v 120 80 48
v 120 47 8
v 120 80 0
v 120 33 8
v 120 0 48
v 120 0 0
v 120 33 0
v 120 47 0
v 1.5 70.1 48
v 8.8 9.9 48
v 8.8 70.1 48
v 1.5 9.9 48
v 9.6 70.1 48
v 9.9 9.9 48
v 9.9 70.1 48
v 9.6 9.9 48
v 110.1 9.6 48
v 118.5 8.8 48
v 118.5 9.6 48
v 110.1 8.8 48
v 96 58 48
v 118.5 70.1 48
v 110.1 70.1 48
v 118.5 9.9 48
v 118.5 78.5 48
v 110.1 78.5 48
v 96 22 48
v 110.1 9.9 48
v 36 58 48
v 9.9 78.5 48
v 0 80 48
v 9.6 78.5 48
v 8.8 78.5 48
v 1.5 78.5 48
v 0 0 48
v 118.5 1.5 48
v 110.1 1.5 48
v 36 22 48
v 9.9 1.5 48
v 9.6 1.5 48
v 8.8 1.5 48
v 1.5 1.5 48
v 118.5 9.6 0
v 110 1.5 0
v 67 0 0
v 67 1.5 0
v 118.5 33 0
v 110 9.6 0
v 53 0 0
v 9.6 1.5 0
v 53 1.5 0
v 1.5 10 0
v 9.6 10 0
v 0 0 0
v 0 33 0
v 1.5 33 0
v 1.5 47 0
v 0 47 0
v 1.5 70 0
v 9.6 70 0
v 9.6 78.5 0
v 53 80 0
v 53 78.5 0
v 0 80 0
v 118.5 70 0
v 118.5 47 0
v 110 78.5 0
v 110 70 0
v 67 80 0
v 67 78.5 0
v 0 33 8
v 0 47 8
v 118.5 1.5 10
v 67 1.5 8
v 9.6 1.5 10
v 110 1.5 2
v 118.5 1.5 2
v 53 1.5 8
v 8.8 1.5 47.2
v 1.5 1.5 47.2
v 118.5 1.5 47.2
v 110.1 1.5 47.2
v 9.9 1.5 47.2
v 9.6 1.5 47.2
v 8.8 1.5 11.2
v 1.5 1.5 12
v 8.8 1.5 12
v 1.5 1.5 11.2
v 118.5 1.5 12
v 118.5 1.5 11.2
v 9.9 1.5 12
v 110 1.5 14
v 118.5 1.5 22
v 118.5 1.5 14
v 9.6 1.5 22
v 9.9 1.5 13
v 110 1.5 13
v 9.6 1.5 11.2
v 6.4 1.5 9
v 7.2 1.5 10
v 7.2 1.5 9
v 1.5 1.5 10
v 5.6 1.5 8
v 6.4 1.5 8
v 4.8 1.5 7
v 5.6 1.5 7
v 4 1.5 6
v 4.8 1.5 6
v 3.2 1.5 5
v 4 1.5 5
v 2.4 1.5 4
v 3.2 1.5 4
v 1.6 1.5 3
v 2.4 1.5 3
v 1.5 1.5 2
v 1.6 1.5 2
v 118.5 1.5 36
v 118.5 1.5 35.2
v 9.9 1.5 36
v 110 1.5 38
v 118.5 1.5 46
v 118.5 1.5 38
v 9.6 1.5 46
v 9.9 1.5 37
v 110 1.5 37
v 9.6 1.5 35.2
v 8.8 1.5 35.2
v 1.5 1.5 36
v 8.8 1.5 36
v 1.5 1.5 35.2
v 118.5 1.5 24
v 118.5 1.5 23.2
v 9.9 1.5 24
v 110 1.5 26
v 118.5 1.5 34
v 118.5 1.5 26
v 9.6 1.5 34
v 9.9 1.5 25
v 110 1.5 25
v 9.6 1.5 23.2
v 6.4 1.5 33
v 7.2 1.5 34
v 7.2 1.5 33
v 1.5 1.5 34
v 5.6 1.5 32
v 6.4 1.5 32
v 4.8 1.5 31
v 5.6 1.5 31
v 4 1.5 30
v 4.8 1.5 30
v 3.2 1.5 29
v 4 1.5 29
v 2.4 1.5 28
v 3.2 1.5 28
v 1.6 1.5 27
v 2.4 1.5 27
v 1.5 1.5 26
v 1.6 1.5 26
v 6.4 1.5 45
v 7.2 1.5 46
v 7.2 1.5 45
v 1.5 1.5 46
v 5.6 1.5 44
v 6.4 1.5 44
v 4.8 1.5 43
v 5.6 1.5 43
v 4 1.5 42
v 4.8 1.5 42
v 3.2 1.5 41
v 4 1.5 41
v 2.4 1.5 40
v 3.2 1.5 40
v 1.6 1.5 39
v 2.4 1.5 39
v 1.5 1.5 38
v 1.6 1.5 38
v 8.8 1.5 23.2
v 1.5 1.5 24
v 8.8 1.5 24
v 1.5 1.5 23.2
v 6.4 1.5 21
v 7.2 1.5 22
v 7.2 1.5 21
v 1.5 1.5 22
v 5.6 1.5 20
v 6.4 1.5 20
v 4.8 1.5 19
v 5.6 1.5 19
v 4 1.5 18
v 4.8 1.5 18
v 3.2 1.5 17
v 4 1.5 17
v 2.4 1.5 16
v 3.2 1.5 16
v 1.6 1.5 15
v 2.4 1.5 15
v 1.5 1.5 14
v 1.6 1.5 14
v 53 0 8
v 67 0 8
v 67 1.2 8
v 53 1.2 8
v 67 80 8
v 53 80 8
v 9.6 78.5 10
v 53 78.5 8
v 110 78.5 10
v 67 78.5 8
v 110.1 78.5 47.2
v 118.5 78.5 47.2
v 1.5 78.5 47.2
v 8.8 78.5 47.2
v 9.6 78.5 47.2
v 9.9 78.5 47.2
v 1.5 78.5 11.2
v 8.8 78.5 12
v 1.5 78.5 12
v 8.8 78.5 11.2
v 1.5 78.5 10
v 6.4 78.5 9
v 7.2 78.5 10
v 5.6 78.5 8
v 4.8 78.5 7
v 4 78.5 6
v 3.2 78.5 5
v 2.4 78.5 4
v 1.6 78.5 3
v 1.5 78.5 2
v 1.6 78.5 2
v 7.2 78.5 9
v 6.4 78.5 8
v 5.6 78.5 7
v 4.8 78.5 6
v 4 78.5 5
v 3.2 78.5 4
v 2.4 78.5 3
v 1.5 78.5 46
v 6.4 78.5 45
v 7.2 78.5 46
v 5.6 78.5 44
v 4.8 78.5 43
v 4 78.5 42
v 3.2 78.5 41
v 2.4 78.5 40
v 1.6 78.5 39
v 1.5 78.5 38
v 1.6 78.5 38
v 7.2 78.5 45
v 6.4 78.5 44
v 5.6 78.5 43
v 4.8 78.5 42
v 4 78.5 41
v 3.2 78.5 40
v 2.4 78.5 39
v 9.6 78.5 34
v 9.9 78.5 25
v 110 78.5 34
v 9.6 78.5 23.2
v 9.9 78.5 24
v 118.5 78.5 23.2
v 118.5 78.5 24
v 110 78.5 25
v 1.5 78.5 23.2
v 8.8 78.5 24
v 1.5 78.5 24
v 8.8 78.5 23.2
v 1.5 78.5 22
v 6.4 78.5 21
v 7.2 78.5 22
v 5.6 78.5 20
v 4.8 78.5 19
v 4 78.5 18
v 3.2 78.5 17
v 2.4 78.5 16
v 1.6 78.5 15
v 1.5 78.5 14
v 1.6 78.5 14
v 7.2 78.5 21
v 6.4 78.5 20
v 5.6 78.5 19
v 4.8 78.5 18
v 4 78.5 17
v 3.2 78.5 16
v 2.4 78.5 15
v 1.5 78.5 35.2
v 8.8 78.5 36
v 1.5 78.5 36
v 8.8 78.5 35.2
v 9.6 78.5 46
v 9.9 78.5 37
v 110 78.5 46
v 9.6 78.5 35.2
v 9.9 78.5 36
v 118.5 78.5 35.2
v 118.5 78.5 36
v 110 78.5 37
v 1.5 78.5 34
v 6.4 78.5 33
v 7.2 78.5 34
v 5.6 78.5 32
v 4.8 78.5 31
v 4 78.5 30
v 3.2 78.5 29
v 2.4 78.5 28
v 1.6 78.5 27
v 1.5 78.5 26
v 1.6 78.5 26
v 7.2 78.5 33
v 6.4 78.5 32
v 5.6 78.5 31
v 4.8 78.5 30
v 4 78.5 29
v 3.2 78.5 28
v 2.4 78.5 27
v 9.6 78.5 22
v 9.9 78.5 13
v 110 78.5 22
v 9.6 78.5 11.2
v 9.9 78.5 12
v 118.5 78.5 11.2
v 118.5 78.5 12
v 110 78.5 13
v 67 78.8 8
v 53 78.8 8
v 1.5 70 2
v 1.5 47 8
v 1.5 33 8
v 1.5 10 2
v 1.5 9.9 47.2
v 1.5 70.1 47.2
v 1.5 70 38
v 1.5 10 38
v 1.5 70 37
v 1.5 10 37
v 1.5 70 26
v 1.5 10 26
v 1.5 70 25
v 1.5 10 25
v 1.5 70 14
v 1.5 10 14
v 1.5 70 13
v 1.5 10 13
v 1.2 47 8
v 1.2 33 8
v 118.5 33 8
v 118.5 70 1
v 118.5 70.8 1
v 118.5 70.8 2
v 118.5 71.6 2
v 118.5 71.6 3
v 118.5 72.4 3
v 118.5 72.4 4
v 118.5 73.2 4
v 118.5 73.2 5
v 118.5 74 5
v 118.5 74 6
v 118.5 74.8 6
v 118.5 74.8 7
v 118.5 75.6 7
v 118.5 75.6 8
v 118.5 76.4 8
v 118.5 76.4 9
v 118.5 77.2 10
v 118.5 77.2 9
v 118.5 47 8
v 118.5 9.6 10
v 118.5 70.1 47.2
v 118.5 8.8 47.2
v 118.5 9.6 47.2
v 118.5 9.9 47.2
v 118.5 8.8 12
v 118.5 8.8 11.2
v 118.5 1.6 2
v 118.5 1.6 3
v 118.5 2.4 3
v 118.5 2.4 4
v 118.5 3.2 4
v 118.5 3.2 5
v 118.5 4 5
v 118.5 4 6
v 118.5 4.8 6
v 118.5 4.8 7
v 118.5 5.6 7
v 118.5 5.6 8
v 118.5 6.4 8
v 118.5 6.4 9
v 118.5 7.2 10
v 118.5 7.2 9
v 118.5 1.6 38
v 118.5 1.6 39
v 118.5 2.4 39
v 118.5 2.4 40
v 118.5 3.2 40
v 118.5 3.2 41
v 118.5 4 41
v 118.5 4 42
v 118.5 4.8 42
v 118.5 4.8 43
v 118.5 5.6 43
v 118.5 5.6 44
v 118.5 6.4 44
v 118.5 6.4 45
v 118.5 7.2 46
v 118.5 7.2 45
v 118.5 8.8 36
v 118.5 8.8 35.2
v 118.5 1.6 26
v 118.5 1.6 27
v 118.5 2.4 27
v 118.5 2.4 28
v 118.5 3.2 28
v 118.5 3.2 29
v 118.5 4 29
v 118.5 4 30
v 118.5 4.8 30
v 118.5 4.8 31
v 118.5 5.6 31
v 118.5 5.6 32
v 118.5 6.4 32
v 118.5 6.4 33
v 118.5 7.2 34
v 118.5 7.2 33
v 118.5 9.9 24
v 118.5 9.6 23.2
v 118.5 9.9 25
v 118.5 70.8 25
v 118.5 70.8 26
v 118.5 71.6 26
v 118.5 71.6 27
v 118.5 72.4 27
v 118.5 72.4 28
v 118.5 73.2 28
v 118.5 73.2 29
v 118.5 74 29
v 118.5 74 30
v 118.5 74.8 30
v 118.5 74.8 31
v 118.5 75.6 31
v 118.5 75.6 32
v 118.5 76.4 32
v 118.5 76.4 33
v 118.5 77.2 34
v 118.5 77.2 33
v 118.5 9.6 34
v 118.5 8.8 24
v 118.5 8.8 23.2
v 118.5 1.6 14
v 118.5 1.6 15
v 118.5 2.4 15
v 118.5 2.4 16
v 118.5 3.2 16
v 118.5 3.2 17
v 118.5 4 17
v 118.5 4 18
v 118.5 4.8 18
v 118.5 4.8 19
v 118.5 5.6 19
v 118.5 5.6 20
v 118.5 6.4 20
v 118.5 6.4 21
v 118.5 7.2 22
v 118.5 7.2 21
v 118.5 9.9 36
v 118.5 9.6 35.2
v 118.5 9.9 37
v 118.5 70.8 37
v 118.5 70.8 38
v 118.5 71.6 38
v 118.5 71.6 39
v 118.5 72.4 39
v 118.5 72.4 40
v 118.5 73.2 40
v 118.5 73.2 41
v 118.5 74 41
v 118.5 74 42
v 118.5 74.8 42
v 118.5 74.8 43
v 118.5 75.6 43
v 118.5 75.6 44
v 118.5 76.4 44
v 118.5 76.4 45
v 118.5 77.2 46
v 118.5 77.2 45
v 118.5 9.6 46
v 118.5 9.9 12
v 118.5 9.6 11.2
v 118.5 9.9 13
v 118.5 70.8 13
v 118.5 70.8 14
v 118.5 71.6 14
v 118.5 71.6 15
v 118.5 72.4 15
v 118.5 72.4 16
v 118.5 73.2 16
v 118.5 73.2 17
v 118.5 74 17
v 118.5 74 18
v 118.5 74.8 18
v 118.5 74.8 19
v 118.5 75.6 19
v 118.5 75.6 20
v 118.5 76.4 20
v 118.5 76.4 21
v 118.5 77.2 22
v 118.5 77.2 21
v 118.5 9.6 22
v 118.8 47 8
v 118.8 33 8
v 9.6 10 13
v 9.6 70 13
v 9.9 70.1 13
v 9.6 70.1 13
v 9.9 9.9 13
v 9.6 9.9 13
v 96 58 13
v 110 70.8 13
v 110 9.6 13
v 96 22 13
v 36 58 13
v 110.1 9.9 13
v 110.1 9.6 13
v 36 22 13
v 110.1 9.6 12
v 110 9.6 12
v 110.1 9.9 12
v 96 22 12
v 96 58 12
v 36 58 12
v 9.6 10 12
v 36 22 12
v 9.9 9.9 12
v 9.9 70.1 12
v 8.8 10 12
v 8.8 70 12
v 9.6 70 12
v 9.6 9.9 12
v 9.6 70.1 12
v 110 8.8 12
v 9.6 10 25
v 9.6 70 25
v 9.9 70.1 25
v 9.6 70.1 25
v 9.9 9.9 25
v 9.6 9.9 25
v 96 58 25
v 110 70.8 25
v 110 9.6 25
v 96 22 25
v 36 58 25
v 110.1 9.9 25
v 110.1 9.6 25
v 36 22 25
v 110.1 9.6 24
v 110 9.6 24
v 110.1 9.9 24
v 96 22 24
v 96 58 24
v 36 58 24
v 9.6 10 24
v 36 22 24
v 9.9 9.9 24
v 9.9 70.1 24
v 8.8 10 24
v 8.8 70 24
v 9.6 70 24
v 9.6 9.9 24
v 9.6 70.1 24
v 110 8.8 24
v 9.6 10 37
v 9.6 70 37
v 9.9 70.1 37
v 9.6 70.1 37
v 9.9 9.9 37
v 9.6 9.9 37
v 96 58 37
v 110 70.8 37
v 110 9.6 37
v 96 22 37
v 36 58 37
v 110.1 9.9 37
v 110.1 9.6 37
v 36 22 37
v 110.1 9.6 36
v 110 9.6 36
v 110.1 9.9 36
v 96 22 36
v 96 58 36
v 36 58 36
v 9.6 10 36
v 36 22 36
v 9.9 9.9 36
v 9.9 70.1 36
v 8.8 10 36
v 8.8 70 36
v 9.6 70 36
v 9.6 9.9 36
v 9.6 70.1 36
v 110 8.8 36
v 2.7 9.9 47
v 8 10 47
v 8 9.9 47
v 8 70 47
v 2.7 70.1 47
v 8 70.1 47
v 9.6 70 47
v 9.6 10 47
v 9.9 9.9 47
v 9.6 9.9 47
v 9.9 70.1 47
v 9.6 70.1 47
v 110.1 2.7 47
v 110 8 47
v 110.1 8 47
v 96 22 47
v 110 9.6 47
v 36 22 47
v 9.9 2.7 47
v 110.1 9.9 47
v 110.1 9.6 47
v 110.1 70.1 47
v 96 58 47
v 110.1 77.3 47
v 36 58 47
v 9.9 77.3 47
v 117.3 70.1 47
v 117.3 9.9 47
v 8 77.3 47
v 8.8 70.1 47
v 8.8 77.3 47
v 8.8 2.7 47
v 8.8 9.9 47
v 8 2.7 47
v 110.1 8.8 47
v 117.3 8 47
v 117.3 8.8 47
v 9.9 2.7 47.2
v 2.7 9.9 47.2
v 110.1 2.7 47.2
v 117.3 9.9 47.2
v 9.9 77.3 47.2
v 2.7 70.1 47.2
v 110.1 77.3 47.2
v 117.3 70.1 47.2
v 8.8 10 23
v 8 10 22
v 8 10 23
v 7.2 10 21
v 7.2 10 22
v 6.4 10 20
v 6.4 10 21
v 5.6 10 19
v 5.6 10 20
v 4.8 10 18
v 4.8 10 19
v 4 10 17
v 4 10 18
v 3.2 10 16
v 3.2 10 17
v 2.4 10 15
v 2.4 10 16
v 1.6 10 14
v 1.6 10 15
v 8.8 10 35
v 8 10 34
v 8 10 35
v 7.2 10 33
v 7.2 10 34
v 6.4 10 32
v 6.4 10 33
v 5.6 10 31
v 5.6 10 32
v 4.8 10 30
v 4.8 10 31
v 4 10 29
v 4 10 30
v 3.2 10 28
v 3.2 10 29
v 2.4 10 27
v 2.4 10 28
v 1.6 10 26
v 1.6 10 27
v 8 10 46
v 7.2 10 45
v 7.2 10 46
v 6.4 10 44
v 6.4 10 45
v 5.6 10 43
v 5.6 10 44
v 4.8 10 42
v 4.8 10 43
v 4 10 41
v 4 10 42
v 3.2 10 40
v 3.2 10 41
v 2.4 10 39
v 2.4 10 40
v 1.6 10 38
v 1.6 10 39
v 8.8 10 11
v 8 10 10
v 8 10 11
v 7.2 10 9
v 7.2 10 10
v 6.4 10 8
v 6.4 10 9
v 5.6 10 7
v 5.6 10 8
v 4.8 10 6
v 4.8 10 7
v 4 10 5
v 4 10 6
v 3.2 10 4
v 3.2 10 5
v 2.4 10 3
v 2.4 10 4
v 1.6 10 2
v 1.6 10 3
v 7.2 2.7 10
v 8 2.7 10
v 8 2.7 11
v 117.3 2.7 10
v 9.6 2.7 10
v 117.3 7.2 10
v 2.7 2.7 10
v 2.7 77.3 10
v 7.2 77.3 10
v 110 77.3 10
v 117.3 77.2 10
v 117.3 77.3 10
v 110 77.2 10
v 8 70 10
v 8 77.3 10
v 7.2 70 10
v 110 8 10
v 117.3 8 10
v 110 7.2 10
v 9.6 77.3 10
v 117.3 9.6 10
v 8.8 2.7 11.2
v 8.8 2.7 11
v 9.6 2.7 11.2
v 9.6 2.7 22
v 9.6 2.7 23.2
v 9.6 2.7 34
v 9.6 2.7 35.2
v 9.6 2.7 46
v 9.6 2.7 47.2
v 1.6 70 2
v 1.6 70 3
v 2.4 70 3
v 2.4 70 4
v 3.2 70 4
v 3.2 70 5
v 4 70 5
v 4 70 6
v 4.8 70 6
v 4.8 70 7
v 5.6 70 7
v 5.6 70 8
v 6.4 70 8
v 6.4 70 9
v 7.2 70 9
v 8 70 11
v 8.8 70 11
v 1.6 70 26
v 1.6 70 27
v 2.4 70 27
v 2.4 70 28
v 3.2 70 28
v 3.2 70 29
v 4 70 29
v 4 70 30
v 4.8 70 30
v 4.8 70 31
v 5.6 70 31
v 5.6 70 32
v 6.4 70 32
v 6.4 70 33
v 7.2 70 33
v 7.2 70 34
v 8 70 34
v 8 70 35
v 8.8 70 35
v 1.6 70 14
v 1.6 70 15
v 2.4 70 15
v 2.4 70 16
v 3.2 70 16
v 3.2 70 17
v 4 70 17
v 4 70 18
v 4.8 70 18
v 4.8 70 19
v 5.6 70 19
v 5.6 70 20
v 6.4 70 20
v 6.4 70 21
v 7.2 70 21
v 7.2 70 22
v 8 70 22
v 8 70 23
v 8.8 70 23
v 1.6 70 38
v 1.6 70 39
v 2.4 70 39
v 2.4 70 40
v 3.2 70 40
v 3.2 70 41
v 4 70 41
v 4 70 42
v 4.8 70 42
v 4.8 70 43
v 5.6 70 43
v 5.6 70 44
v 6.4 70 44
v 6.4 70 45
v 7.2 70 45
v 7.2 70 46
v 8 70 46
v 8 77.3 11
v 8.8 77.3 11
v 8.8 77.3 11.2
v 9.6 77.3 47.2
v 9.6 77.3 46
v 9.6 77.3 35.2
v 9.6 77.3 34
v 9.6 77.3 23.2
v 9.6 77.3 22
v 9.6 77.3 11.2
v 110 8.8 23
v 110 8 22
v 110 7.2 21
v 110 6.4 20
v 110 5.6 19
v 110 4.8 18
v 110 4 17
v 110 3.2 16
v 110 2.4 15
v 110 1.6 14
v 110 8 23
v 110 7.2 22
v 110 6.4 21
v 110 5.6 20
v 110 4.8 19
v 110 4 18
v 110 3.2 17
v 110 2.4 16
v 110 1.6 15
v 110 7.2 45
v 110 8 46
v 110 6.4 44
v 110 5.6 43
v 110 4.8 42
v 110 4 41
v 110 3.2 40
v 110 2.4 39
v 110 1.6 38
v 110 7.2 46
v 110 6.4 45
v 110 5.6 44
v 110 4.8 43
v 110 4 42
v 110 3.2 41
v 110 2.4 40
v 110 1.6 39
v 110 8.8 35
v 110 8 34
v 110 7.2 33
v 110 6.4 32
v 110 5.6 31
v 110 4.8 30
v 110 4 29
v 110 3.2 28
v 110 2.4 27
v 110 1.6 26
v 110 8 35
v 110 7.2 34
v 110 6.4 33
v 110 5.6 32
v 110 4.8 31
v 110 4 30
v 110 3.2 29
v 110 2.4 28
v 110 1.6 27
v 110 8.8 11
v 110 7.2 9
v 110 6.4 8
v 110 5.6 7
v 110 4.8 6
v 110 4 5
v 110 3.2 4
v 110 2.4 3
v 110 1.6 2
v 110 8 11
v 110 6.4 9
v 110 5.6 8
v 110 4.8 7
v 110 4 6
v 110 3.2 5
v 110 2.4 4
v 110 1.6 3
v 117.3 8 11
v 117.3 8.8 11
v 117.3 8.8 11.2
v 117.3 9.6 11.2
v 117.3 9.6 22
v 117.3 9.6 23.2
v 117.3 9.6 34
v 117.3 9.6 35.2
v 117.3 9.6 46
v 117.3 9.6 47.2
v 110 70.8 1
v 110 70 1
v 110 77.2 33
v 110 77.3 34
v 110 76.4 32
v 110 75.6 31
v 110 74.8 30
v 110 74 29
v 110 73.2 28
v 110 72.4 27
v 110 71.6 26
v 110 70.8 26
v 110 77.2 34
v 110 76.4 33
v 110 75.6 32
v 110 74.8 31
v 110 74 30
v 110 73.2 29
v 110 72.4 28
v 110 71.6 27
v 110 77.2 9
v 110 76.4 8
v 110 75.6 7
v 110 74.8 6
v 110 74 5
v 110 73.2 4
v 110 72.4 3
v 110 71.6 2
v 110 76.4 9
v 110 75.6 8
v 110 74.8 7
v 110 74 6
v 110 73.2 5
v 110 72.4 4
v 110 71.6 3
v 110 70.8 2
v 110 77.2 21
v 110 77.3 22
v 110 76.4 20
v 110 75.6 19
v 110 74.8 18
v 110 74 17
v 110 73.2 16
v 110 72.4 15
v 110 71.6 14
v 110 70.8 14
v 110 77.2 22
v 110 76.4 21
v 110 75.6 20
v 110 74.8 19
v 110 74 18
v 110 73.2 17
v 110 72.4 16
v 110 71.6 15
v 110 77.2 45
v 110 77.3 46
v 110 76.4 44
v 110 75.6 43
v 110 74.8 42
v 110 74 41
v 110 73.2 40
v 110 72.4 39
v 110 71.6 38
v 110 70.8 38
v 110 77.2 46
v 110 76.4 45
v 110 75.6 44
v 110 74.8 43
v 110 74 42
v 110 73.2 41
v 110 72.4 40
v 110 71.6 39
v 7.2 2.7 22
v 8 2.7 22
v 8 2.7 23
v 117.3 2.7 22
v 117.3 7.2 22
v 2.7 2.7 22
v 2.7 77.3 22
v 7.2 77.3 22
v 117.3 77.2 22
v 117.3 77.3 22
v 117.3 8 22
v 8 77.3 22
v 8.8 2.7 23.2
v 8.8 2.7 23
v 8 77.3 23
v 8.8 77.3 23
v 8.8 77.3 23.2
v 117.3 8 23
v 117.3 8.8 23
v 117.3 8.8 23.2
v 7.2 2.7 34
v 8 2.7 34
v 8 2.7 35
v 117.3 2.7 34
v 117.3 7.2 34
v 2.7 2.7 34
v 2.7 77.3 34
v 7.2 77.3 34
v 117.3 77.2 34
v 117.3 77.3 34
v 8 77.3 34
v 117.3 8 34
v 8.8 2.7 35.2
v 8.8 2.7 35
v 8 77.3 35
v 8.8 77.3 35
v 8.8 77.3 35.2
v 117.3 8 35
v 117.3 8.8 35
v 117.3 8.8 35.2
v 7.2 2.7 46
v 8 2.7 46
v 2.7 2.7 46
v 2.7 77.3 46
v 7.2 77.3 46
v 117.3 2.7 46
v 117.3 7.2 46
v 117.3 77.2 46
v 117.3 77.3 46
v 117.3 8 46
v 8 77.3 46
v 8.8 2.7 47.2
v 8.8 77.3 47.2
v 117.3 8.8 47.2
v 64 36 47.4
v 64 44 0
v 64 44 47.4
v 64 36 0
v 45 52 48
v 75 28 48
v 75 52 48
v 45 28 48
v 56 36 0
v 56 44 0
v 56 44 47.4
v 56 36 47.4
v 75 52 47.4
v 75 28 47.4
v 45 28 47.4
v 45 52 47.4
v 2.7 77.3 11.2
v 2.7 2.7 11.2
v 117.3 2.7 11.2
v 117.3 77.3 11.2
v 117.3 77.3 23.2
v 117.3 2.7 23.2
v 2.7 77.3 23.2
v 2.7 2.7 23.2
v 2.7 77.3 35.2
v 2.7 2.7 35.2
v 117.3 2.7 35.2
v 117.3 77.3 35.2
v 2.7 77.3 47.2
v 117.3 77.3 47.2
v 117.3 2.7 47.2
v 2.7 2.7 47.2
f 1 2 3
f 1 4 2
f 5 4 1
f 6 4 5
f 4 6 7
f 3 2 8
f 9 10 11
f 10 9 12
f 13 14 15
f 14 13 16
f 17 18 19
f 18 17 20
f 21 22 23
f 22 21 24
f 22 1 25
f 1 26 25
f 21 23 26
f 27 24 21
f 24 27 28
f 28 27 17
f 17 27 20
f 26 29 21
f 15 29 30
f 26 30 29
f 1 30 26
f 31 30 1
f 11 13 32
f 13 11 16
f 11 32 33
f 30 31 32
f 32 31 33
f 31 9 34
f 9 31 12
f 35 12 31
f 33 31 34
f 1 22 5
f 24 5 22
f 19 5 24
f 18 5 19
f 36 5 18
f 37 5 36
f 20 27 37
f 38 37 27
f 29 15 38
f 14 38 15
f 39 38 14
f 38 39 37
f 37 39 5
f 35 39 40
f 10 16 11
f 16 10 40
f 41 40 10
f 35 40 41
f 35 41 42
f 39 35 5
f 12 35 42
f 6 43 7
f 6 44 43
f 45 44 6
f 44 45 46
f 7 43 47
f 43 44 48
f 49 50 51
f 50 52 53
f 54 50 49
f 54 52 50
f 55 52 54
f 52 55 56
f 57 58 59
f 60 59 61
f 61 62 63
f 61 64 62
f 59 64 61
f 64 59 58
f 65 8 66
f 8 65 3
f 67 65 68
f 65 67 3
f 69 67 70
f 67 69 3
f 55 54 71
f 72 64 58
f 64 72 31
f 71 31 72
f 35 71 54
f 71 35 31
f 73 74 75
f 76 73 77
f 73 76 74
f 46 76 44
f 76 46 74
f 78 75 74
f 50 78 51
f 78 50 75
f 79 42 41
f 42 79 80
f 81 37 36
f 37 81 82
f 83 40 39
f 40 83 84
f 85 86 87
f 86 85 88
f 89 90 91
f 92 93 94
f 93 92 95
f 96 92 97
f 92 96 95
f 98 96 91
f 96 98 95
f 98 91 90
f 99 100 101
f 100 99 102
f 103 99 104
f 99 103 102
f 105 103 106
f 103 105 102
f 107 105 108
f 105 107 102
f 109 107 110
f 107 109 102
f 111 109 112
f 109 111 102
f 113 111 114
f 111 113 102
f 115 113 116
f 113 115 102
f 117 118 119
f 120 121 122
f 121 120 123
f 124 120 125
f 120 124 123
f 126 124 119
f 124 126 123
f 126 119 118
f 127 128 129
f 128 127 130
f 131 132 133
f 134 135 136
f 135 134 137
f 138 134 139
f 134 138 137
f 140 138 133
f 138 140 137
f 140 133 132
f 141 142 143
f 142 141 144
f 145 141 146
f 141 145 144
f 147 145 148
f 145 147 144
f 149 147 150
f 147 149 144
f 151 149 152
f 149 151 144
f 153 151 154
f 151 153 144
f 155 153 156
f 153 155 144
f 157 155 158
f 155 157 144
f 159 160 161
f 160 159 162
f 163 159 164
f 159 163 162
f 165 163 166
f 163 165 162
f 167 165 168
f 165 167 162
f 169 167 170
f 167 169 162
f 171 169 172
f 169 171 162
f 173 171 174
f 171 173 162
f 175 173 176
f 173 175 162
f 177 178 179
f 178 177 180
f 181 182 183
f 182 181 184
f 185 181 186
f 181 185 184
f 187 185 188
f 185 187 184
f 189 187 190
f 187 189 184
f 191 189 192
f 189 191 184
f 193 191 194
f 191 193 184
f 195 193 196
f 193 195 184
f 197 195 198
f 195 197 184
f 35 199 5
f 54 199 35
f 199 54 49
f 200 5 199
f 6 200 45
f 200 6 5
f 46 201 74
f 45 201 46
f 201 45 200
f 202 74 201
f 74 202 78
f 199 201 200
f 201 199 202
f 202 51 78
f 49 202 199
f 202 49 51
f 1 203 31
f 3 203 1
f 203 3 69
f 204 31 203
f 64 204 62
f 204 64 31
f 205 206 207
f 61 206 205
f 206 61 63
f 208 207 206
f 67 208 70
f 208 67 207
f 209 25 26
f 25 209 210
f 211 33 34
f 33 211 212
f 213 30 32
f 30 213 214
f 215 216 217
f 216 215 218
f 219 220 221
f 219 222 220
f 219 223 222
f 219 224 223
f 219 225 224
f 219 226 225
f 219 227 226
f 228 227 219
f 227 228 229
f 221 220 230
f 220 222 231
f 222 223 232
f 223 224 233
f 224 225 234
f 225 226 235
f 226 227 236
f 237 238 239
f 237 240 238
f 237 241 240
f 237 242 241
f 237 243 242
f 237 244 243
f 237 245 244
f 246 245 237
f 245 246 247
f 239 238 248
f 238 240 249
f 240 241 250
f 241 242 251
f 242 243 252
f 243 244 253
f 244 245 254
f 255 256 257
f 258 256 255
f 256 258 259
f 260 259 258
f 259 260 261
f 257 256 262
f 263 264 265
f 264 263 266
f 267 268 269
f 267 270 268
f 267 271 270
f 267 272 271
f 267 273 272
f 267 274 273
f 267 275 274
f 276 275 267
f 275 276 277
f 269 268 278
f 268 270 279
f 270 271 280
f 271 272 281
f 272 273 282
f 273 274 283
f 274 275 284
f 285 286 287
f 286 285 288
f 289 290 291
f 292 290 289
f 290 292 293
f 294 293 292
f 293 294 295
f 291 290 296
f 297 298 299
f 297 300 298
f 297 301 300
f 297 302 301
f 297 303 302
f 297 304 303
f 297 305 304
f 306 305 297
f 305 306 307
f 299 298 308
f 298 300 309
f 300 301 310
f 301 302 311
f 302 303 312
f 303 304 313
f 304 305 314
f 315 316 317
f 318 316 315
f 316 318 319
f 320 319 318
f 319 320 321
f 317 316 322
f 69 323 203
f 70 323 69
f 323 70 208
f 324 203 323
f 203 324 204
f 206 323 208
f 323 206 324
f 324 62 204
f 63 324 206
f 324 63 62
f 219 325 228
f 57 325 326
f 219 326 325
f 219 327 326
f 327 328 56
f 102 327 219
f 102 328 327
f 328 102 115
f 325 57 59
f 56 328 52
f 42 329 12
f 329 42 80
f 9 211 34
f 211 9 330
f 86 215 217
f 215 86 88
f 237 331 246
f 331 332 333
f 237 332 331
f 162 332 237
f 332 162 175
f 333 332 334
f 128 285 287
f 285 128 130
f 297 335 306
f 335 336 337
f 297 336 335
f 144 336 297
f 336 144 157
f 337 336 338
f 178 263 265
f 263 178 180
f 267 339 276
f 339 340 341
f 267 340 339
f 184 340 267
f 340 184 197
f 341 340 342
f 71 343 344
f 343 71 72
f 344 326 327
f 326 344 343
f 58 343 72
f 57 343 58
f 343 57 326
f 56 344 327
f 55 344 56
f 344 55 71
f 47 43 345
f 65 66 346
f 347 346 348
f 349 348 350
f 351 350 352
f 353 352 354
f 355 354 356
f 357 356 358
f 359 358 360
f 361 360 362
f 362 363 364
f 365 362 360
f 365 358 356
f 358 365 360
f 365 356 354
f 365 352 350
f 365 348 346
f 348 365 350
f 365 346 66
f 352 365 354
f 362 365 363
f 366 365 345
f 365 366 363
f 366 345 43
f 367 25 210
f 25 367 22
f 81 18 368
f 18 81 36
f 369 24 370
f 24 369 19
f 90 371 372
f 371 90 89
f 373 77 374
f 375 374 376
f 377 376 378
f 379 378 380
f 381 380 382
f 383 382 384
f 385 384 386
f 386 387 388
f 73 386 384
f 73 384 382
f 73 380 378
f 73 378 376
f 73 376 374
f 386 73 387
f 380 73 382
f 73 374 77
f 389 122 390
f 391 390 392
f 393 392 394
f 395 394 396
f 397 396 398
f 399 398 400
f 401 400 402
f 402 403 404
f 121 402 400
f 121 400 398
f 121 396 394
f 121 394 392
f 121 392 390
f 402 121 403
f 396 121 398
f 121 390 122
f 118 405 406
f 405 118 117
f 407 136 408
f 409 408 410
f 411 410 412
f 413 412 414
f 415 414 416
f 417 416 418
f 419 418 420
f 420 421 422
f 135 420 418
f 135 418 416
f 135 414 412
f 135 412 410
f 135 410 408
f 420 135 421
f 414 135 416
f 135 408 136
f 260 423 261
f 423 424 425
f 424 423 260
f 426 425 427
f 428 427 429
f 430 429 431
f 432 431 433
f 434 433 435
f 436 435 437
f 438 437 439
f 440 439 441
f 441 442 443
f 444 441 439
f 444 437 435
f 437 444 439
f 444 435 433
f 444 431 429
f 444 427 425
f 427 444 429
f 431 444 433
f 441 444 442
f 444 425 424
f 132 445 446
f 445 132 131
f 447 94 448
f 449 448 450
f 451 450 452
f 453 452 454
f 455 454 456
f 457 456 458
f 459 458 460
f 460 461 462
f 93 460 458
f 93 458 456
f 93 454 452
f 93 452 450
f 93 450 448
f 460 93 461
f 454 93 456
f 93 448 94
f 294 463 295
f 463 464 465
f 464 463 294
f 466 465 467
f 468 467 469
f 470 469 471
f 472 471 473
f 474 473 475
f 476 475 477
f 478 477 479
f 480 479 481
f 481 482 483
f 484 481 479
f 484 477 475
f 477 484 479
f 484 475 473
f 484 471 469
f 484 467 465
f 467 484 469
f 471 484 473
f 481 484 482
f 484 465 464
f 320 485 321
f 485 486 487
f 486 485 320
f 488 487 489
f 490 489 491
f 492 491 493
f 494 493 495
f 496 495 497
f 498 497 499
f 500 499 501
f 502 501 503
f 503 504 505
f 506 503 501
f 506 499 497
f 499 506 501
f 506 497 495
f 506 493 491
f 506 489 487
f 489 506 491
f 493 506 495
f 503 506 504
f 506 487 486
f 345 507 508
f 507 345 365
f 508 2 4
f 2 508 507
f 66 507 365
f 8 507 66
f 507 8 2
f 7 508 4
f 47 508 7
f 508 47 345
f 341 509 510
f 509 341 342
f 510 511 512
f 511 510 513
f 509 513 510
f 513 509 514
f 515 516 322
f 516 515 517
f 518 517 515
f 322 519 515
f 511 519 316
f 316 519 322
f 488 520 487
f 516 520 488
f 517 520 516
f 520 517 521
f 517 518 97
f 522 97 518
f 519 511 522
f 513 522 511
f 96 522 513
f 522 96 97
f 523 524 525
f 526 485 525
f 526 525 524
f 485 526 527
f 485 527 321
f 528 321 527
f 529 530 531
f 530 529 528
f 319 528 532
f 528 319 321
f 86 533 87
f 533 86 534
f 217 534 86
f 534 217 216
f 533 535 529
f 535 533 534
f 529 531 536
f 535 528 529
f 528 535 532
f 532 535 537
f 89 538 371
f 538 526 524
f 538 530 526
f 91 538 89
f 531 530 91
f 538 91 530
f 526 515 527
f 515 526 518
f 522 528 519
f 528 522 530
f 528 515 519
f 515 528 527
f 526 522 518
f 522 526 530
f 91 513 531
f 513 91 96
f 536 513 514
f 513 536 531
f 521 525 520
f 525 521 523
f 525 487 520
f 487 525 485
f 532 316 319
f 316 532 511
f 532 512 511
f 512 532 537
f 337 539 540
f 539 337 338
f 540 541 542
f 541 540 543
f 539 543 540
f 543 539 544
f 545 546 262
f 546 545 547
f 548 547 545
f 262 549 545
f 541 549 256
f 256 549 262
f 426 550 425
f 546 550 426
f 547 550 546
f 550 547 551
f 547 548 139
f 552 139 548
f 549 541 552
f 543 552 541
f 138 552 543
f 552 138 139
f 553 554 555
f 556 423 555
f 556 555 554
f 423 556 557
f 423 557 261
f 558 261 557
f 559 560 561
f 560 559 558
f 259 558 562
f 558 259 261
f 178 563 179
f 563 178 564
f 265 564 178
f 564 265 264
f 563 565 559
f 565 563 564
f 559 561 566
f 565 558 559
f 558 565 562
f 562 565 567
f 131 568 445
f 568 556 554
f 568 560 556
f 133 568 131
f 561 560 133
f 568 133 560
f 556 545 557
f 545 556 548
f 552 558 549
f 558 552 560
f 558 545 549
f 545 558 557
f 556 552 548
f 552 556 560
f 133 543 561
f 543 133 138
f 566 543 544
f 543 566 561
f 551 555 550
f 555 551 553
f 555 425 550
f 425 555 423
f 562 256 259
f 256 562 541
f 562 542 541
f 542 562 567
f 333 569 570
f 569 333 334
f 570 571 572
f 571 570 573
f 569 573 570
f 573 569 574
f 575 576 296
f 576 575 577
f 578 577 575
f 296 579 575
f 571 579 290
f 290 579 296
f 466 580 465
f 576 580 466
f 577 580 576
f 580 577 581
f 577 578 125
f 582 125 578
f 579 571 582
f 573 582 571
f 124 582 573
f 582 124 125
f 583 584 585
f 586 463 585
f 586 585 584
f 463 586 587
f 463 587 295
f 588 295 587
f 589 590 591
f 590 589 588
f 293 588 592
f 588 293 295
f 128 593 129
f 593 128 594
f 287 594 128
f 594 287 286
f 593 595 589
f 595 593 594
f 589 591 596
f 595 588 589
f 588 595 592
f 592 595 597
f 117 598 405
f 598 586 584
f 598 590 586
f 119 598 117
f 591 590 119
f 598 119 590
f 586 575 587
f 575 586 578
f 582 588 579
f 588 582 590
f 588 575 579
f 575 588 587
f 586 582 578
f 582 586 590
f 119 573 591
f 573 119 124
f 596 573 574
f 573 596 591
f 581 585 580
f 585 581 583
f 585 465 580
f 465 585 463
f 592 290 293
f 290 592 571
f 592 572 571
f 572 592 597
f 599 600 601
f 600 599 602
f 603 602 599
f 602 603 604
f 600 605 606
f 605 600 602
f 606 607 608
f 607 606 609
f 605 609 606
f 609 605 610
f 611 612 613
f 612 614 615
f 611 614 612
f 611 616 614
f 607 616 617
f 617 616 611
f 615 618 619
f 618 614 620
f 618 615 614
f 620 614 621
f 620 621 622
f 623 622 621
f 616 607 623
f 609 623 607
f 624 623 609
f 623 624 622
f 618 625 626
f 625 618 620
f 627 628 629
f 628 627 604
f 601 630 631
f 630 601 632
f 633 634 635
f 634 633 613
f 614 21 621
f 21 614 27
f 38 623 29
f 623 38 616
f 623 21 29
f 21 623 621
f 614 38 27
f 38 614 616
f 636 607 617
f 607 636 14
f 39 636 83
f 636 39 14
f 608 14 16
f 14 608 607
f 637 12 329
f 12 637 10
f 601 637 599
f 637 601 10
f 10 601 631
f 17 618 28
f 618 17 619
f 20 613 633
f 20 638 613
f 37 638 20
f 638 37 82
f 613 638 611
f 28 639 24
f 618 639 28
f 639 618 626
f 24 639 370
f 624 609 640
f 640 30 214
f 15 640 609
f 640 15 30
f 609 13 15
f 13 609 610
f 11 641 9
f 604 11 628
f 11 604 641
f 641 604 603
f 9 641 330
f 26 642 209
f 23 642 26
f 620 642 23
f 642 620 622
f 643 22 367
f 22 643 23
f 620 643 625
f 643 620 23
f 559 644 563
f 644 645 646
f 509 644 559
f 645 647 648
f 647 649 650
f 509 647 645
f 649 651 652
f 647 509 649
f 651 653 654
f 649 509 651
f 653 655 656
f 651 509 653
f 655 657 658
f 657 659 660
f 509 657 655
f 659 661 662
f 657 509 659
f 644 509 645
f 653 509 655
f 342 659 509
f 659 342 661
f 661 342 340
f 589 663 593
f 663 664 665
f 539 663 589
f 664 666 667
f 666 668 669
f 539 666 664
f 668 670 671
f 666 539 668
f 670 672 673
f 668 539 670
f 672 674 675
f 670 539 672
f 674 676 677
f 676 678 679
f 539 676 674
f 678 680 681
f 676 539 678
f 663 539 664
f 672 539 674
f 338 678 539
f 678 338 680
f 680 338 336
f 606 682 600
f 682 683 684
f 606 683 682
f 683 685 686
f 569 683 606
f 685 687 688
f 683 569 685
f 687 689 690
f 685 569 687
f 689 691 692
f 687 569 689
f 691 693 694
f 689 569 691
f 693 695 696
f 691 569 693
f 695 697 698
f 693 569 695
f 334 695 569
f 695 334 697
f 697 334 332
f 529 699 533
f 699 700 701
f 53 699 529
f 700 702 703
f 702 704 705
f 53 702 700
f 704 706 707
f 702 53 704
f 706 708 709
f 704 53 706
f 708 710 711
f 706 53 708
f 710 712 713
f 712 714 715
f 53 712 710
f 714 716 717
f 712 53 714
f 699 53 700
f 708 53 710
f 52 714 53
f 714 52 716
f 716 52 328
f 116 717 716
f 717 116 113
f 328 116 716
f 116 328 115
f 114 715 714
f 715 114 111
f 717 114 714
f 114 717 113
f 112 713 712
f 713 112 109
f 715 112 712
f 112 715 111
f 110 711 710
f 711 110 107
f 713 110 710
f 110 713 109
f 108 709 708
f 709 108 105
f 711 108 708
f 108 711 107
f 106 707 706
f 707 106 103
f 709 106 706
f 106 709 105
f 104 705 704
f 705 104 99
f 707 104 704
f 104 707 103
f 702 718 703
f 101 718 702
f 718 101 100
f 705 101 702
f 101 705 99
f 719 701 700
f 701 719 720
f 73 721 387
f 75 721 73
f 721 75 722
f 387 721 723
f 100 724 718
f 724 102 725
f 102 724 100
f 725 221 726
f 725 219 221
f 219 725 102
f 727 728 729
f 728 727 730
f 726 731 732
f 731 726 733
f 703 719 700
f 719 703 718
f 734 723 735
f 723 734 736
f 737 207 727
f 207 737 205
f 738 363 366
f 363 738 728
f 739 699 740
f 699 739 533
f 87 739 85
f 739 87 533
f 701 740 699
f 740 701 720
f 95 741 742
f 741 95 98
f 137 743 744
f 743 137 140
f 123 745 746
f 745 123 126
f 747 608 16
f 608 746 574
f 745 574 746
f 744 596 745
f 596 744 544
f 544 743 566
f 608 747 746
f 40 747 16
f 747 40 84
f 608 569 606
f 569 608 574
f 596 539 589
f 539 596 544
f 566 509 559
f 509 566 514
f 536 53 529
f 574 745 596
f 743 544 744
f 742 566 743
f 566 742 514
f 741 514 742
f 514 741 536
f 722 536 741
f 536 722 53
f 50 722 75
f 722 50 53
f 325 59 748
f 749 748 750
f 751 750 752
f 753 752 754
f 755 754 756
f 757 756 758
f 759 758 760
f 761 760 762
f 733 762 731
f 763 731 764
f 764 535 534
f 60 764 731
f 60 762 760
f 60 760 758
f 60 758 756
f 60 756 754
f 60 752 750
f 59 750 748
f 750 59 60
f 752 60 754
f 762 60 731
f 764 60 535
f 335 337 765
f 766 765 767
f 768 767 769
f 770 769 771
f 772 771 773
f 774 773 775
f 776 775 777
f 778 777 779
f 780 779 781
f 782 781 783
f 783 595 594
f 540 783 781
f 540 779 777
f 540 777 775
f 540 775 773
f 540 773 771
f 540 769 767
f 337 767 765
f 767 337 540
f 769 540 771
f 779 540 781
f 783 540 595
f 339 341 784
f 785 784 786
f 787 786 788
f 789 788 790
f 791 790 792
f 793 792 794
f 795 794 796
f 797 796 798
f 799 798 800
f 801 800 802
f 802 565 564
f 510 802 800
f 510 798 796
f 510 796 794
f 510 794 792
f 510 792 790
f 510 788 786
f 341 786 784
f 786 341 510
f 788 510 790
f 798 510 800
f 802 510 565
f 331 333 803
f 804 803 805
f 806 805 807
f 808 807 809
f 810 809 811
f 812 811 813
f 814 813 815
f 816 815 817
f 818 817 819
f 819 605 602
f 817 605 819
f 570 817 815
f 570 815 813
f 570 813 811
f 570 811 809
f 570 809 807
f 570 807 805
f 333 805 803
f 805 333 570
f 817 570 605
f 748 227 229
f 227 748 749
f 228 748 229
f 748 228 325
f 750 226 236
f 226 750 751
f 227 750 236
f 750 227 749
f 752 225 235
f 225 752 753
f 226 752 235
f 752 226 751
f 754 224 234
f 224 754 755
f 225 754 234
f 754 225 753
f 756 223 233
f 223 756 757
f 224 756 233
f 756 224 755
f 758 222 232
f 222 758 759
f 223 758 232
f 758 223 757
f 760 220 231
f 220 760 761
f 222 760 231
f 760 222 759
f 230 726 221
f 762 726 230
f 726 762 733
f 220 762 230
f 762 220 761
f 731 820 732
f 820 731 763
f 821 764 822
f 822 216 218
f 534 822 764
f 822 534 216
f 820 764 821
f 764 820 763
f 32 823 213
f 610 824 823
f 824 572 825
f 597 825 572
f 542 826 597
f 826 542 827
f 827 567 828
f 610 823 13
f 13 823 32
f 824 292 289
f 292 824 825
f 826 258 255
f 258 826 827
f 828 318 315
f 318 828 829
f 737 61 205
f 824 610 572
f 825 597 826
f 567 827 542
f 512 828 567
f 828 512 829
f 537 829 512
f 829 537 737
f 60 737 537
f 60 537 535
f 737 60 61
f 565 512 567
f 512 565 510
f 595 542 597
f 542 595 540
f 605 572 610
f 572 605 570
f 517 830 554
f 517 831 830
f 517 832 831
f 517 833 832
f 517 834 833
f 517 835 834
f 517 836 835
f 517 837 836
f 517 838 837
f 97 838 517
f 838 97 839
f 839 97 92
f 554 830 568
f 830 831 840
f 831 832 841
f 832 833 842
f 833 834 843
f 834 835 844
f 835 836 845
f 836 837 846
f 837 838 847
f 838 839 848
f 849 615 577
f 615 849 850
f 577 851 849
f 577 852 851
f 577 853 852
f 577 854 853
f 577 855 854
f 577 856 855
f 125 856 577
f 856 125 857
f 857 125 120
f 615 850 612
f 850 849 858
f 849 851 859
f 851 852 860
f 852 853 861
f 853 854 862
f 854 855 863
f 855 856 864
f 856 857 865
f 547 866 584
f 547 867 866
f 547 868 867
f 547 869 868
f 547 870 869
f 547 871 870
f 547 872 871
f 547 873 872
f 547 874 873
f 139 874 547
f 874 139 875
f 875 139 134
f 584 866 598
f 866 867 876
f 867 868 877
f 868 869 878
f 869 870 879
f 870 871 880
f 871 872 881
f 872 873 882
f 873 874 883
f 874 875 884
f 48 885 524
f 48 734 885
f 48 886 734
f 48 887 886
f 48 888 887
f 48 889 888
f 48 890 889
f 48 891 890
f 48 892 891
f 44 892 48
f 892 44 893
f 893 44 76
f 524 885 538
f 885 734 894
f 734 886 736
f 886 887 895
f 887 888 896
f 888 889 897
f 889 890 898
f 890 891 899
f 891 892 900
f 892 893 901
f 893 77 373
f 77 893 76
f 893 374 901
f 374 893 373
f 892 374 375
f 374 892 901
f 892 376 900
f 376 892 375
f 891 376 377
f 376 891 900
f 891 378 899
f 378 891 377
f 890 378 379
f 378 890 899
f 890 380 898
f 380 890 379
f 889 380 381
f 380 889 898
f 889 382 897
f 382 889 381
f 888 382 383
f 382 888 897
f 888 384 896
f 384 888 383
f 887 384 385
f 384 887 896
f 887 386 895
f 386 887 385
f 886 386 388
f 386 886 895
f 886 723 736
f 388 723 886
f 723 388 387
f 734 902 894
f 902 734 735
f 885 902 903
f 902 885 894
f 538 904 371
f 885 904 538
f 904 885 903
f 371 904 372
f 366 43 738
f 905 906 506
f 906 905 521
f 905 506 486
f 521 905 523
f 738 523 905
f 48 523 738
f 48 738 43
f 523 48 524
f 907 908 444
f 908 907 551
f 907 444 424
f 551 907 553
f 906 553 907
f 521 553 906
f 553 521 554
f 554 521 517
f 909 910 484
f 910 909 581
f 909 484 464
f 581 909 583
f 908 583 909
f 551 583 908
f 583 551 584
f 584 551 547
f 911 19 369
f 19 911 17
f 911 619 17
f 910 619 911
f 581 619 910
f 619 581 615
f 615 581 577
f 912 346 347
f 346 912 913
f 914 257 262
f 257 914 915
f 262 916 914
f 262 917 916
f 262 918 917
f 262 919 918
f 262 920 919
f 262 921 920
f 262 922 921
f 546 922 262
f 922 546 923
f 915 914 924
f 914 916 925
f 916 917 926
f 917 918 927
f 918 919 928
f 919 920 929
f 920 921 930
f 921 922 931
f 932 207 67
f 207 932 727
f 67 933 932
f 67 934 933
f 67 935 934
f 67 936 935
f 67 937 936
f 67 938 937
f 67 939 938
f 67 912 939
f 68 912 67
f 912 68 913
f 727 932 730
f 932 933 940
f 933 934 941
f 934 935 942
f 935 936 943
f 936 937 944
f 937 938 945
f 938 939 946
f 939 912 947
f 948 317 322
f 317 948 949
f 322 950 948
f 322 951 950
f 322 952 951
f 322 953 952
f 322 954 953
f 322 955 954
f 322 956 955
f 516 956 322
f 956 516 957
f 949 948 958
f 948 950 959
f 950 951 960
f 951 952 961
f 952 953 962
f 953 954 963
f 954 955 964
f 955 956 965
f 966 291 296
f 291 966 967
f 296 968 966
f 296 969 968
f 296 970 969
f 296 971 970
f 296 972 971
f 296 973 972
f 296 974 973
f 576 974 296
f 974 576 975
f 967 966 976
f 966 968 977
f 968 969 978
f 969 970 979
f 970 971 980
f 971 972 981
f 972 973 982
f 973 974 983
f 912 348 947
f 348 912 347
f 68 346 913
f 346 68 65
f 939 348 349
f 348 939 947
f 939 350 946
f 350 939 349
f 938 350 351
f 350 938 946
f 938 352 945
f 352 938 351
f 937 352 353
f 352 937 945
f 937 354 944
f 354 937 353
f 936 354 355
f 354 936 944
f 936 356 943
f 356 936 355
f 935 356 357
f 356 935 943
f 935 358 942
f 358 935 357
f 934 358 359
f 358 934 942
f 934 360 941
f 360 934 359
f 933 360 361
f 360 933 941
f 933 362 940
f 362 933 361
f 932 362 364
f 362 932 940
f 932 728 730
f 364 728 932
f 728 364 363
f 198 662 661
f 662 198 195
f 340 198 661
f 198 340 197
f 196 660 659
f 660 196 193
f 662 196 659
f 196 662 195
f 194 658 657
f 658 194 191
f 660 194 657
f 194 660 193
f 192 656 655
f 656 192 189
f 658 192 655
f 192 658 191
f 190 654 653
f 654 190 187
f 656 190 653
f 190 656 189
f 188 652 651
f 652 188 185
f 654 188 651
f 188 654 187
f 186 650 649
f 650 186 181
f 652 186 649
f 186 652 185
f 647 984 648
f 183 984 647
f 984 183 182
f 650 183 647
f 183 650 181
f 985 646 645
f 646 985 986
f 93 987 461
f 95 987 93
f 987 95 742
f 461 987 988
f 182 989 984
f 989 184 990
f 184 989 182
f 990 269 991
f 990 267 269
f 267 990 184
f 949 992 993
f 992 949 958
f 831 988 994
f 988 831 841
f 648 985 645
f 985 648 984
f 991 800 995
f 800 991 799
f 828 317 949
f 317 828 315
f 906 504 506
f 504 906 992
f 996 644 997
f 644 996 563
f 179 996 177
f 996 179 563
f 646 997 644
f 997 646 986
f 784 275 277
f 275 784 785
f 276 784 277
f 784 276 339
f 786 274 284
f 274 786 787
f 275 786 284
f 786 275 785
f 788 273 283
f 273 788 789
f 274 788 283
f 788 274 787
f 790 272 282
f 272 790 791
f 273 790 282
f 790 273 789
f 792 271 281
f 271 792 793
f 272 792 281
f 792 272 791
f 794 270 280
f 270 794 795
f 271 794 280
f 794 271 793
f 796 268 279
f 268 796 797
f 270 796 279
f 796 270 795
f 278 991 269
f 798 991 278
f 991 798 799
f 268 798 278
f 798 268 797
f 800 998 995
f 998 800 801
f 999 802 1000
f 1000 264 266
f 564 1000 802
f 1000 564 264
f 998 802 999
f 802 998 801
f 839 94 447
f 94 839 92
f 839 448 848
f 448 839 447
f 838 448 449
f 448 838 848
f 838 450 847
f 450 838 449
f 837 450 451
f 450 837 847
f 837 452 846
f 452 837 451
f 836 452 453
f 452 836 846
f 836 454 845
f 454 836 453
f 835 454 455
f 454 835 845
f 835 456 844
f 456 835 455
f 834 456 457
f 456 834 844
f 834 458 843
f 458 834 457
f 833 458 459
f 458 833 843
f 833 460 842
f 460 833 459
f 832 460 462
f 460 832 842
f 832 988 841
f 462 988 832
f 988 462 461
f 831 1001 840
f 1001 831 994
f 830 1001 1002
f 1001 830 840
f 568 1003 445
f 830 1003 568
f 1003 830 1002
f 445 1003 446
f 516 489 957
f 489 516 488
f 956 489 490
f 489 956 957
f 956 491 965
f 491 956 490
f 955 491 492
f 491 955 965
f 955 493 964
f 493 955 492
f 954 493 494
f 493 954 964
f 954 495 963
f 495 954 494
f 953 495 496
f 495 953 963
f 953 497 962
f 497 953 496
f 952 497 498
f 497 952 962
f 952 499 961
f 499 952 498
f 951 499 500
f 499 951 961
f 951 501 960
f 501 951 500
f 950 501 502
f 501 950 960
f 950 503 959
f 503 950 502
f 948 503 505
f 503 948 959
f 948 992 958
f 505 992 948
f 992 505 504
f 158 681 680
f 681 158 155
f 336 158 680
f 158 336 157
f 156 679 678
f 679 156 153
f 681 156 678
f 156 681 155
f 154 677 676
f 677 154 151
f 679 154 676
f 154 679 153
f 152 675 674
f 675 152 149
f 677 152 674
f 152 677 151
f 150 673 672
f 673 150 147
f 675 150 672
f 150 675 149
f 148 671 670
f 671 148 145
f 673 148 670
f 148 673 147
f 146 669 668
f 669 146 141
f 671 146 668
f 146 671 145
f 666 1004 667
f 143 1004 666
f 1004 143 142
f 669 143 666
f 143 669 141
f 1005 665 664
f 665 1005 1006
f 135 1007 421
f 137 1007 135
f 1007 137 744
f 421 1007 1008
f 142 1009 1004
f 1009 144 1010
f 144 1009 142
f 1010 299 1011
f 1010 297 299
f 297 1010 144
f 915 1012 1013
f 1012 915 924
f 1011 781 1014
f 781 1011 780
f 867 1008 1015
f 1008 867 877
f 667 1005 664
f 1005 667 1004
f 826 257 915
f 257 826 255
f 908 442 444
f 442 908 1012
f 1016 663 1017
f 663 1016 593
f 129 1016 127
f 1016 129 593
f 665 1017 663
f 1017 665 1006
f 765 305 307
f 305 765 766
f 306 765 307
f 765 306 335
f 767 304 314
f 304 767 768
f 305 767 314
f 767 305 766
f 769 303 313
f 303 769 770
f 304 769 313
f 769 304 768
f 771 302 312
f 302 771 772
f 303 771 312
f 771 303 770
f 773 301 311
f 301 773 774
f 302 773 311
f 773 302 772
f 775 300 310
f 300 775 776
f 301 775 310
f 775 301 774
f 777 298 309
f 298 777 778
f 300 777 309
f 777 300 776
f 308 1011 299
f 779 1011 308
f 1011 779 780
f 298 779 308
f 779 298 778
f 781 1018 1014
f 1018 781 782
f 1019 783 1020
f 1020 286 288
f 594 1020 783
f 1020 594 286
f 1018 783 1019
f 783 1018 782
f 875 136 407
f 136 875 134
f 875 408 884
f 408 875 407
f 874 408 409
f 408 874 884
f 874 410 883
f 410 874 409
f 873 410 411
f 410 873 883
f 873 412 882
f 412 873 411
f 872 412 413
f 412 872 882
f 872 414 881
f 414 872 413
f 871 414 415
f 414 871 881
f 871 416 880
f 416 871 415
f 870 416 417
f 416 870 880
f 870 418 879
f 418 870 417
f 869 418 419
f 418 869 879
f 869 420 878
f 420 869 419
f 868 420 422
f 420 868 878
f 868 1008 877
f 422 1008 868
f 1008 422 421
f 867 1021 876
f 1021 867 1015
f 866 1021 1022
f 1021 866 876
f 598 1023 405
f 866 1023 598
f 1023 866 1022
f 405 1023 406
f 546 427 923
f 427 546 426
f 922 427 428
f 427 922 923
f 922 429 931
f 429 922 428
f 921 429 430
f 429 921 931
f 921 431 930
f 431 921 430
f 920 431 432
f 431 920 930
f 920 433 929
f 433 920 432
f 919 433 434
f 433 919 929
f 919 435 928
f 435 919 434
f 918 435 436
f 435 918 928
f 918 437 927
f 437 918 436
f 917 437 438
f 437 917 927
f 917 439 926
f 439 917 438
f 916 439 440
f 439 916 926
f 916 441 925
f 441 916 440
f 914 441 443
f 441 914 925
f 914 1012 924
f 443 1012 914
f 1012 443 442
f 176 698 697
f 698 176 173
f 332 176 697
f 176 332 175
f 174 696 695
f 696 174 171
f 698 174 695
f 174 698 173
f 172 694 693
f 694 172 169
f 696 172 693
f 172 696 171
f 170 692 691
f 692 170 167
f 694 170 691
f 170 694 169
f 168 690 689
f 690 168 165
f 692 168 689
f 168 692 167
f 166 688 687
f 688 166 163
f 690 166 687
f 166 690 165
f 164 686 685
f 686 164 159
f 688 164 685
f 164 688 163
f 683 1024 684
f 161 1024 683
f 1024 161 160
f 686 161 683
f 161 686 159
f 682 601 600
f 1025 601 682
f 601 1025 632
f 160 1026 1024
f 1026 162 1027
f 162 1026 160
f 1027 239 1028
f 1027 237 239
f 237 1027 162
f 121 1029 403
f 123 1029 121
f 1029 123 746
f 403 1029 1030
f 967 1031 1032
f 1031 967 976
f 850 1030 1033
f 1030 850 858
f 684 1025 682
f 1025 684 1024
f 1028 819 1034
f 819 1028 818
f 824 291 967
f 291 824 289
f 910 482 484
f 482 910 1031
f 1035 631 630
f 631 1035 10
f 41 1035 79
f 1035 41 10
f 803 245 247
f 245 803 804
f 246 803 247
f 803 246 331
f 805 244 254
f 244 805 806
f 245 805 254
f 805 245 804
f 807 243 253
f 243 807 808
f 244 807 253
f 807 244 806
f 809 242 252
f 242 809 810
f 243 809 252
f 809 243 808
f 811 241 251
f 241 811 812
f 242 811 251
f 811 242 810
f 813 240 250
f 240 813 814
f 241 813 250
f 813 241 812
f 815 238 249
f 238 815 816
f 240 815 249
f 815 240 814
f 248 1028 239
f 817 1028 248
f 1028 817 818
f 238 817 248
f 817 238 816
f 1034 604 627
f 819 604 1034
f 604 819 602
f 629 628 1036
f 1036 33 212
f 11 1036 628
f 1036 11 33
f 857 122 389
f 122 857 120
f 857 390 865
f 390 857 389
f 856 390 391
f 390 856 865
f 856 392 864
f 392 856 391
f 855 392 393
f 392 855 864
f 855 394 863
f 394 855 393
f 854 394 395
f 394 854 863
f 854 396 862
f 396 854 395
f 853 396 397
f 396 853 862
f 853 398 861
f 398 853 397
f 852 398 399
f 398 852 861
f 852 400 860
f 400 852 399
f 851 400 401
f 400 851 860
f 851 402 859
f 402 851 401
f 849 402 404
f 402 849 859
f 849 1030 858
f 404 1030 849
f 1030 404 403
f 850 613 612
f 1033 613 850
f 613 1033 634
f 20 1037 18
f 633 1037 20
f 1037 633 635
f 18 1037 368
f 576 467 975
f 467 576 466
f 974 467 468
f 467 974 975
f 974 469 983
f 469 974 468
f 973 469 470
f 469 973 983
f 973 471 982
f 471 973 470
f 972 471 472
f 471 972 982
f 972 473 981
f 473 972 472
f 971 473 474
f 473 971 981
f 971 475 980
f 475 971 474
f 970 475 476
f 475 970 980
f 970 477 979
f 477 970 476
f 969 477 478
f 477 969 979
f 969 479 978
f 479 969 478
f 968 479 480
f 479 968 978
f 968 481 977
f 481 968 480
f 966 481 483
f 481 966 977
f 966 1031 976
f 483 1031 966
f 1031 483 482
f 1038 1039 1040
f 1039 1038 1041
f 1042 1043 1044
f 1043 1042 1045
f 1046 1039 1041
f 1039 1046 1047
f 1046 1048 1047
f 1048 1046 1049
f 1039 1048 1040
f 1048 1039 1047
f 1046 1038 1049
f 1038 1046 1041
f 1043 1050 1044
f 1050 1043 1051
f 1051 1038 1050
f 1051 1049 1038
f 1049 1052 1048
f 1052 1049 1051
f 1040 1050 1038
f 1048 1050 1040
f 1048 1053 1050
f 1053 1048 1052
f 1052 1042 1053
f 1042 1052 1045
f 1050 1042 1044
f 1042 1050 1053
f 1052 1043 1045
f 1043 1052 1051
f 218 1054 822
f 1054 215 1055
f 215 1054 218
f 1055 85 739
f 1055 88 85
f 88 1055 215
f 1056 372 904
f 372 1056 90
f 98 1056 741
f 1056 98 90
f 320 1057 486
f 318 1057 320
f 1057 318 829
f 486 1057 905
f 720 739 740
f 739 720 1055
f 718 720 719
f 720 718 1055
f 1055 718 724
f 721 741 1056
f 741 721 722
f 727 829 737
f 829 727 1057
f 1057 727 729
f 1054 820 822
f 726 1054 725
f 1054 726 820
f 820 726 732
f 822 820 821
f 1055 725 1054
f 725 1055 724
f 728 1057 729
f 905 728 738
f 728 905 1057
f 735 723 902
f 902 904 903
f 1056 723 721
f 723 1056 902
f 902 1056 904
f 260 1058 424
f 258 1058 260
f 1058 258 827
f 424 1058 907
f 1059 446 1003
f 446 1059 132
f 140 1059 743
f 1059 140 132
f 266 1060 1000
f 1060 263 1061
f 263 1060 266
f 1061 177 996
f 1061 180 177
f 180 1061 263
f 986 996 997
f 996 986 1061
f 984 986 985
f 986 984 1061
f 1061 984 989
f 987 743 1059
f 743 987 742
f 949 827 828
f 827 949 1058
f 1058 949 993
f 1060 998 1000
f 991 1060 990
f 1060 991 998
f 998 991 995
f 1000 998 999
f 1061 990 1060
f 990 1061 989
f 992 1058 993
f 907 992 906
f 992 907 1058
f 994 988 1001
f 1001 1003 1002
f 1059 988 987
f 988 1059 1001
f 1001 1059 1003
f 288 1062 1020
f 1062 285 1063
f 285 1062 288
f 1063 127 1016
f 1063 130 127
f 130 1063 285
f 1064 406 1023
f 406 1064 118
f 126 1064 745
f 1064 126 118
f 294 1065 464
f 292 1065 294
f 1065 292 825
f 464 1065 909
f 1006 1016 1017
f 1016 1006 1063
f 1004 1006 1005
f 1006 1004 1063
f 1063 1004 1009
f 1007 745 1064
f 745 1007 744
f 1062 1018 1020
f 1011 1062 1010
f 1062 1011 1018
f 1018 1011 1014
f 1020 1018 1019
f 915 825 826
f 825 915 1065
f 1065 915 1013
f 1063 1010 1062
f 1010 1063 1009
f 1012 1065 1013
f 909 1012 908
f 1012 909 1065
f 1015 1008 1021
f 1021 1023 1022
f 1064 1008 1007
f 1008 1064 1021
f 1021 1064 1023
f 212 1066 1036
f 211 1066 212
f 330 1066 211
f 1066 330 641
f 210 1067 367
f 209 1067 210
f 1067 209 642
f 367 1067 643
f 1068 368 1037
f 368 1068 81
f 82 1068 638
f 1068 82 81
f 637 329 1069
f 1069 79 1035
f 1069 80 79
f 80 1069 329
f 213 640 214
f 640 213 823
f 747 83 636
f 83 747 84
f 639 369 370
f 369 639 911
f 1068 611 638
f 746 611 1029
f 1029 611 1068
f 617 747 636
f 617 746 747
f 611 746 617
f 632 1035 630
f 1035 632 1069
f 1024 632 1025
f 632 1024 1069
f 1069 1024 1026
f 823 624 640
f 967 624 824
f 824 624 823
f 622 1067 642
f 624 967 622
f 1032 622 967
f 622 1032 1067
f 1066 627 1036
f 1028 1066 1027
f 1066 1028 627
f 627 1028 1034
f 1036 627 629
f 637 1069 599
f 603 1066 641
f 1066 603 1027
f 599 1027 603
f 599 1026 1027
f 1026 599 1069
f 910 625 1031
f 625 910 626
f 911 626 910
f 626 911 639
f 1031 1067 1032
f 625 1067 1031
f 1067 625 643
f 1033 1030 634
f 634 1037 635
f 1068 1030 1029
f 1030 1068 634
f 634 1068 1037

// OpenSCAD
// battle_complex.scad —— 超大型综合体 120×80×48（占地 9600㎡，desert 巨无霸地标）
// 可进入：四面外墙中央大门（14×8，≥6 nav cells 净空）→ 中庭（60×36 通高天井）+ 4 层环廊（可站可守）
// 结构：中央核心筒（电梯+机房 8×8×48）+ 4 角楼梯井（10×10，交错直跑可逐级攀爬）+ 屋顶直升机坪
// 规范：角点原点（min=0,0,0）、Z-up、color() 上色、bbox 精确 = REAL_DIMS 120×80×48（无任何超界元素）
$fn = 8;
W = 120; D = 80; H = 48; TH = 1.5; FH = 12;
AT_X = 36; AT_W = 60; AT_Y = 22; AT_D = 36;   // 中庭 60×36（x[36,96] y[22,58]，通高到屋顶）
ST = 10;                                       // 楼梯井 10×10（四角）

// 直跑楼梯（沿 X / 沿 Y 上行，每级 1m）
module stairX(width, n, run, rise) { for (i = [0:n-1]) translate([i*run, 0, 0]) cube([run, width, (i+1)*rise]); }
module stairY(width, n, run, rise) { for (i = [0:n-1]) translate([0, i*run, 0]) cube([width, run, (i+1)*rise]); }

// 楼板（挖中庭 + 4 角楼梯井；挖洞与外墙留 0.1 间隙，避免 CGAL 共享面毛刺）
module slab(z) {
  difference() {
    translate([0, 0, z]) cube([W, D, 1]);
    translate([AT_X, AT_Y, z-0.2]) cube([AT_W, AT_D, 1.4]);      // 中庭
    translate([0.1, 0.1, z-0.2]) cube([ST-0.2, ST-0.2, 1.4]);                 // 楼梯井×4
    translate([W-ST+0.1, 0.1, z-0.2]) cube([ST-0.2, ST-0.2, 1.4]);
    translate([0.1, D-ST+0.1, z-0.2]) cube([ST-0.2, ST-0.2, 1.4]);
    translate([W-ST+0.1, D-ST+0.1, z-0.2]) cube([ST-0.2, ST-0.2, 1.4]);
  }
}
// 外墙（4 面，厚 1.5，中央大门 14×8）
module walls() {
  color("#9aa0a8") {
    difference() { translate([0, 0, 0]) cube([W, TH, H]); translate([53, -0.5, 0]) cube([14, TH+1, 8]); }     // 南
    difference() { translate([0, D-TH, 0]) cube([W, TH, H]); translate([53, D-TH-0.5, 0]) cube([14, TH+1, 8]); } // 北
    difference() { translate([0, 0, 0]) cube([TH, D, H]); translate([-0.5, 33, 0]) cube([TH+1, 14, 8]); }       // 西
    difference() { translate([W-TH, 0, 0]) cube([TH, D, H]); translate([W-TH-0.5, 33, 0]) cube([TH+1, 14, 8]); } // 东
  }
}
// 楼梯（4 角井内，每层 12 级 rise1 run0.8 —— 全部缩进井内，不超 bbox）
module stairs() {
  color("#bcc2c8") {
    for (k = [0:3]) {
      z0 = k * FH;
      translate([0, 0, z0]) stairX(10, 12, 0.8, 1);        // SW（沿 x 0~9.6）
      translate([0, D-ST, z0]) stairX(10, 12, 0.8, 1);     // NW
      translate([W-ST, 0, z0]) stairY(10, 12, 0.8, 1);     // SE（沿 y 0~9.6）
      translate([W-ST, D-ST, z0]) stairY(10, 12, 0.8, 1);  // NE（沿 y 70~79.6）
    }
  }
}
// 中央核心筒（电梯井 + 顶机房）
module core() {
  color("#7e8a96") translate([56, 36, 0]) cube([8, 8, 48]);
  color("#6f7681") translate([58, 38, 44]) cube([4, 4, 4]);
}
// 屋顶：直升机坪（中庭上方）+ 短天线（全部压在 bbox 48 内）
module roof() {
  color("#888") translate([45, 28, 47.4]) cube([30, 24, 0.6]);   // 直升机坪 z[47.4,48]
  color("#555") translate([60, 40, 46.5]) cylinder(r = 0.8, h = 1.5); // 天线 z[46.5,48]
  color("#c33") translate([60, 40, 47.2]) sphere(r = 0.8);        // 警示灯 顶=48
}
// 外立面窗带（每层凸横带）+ 4 门雨棚（不超 bbox）
module facade() {
  color("#aab0b8") {
    for (k = [1:4]) {
      translate([TH, TH, k*FH-2]) cube([W-2*TH, 1.2, 1.2]);        // 南窗带
      translate([TH, D-TH-1.2, k*FH-2]) cube([W-2*TH, 1.2, 1.2]);  // 北窗带
      translate([TH, TH, k*FH-2]) cube([1.2, D-2*TH, 1.2]);        // 西窗带
      translate([W-TH-1.2, TH, k*FH-2]) cube([1.2, D-2*TH, 1.2]);  // 东窗带
    }
  }
  color("#6f7681") {
    translate([50, 0, 8]) cube([20, 1.2, 0.6]);                    // 南雨棚
    translate([50, D-1.2, 8]) cube([20, 1.2, 0.6]);                // 北雨棚
    translate([0, 30, 8]) cube([1.2, 20, 0.6]);                    // 西雨棚
    translate([W-1.2, 30, 8]) cube([1.2, 20, 0.6]);                // 东雨棚
  }
}

module complex() {
  walls();
  for (k = [1:3]) slab(k * FH);
  slab(47);          // 屋顶板 47~48
  stairs();
  core();
  roof();
  facade();
}
complex();
